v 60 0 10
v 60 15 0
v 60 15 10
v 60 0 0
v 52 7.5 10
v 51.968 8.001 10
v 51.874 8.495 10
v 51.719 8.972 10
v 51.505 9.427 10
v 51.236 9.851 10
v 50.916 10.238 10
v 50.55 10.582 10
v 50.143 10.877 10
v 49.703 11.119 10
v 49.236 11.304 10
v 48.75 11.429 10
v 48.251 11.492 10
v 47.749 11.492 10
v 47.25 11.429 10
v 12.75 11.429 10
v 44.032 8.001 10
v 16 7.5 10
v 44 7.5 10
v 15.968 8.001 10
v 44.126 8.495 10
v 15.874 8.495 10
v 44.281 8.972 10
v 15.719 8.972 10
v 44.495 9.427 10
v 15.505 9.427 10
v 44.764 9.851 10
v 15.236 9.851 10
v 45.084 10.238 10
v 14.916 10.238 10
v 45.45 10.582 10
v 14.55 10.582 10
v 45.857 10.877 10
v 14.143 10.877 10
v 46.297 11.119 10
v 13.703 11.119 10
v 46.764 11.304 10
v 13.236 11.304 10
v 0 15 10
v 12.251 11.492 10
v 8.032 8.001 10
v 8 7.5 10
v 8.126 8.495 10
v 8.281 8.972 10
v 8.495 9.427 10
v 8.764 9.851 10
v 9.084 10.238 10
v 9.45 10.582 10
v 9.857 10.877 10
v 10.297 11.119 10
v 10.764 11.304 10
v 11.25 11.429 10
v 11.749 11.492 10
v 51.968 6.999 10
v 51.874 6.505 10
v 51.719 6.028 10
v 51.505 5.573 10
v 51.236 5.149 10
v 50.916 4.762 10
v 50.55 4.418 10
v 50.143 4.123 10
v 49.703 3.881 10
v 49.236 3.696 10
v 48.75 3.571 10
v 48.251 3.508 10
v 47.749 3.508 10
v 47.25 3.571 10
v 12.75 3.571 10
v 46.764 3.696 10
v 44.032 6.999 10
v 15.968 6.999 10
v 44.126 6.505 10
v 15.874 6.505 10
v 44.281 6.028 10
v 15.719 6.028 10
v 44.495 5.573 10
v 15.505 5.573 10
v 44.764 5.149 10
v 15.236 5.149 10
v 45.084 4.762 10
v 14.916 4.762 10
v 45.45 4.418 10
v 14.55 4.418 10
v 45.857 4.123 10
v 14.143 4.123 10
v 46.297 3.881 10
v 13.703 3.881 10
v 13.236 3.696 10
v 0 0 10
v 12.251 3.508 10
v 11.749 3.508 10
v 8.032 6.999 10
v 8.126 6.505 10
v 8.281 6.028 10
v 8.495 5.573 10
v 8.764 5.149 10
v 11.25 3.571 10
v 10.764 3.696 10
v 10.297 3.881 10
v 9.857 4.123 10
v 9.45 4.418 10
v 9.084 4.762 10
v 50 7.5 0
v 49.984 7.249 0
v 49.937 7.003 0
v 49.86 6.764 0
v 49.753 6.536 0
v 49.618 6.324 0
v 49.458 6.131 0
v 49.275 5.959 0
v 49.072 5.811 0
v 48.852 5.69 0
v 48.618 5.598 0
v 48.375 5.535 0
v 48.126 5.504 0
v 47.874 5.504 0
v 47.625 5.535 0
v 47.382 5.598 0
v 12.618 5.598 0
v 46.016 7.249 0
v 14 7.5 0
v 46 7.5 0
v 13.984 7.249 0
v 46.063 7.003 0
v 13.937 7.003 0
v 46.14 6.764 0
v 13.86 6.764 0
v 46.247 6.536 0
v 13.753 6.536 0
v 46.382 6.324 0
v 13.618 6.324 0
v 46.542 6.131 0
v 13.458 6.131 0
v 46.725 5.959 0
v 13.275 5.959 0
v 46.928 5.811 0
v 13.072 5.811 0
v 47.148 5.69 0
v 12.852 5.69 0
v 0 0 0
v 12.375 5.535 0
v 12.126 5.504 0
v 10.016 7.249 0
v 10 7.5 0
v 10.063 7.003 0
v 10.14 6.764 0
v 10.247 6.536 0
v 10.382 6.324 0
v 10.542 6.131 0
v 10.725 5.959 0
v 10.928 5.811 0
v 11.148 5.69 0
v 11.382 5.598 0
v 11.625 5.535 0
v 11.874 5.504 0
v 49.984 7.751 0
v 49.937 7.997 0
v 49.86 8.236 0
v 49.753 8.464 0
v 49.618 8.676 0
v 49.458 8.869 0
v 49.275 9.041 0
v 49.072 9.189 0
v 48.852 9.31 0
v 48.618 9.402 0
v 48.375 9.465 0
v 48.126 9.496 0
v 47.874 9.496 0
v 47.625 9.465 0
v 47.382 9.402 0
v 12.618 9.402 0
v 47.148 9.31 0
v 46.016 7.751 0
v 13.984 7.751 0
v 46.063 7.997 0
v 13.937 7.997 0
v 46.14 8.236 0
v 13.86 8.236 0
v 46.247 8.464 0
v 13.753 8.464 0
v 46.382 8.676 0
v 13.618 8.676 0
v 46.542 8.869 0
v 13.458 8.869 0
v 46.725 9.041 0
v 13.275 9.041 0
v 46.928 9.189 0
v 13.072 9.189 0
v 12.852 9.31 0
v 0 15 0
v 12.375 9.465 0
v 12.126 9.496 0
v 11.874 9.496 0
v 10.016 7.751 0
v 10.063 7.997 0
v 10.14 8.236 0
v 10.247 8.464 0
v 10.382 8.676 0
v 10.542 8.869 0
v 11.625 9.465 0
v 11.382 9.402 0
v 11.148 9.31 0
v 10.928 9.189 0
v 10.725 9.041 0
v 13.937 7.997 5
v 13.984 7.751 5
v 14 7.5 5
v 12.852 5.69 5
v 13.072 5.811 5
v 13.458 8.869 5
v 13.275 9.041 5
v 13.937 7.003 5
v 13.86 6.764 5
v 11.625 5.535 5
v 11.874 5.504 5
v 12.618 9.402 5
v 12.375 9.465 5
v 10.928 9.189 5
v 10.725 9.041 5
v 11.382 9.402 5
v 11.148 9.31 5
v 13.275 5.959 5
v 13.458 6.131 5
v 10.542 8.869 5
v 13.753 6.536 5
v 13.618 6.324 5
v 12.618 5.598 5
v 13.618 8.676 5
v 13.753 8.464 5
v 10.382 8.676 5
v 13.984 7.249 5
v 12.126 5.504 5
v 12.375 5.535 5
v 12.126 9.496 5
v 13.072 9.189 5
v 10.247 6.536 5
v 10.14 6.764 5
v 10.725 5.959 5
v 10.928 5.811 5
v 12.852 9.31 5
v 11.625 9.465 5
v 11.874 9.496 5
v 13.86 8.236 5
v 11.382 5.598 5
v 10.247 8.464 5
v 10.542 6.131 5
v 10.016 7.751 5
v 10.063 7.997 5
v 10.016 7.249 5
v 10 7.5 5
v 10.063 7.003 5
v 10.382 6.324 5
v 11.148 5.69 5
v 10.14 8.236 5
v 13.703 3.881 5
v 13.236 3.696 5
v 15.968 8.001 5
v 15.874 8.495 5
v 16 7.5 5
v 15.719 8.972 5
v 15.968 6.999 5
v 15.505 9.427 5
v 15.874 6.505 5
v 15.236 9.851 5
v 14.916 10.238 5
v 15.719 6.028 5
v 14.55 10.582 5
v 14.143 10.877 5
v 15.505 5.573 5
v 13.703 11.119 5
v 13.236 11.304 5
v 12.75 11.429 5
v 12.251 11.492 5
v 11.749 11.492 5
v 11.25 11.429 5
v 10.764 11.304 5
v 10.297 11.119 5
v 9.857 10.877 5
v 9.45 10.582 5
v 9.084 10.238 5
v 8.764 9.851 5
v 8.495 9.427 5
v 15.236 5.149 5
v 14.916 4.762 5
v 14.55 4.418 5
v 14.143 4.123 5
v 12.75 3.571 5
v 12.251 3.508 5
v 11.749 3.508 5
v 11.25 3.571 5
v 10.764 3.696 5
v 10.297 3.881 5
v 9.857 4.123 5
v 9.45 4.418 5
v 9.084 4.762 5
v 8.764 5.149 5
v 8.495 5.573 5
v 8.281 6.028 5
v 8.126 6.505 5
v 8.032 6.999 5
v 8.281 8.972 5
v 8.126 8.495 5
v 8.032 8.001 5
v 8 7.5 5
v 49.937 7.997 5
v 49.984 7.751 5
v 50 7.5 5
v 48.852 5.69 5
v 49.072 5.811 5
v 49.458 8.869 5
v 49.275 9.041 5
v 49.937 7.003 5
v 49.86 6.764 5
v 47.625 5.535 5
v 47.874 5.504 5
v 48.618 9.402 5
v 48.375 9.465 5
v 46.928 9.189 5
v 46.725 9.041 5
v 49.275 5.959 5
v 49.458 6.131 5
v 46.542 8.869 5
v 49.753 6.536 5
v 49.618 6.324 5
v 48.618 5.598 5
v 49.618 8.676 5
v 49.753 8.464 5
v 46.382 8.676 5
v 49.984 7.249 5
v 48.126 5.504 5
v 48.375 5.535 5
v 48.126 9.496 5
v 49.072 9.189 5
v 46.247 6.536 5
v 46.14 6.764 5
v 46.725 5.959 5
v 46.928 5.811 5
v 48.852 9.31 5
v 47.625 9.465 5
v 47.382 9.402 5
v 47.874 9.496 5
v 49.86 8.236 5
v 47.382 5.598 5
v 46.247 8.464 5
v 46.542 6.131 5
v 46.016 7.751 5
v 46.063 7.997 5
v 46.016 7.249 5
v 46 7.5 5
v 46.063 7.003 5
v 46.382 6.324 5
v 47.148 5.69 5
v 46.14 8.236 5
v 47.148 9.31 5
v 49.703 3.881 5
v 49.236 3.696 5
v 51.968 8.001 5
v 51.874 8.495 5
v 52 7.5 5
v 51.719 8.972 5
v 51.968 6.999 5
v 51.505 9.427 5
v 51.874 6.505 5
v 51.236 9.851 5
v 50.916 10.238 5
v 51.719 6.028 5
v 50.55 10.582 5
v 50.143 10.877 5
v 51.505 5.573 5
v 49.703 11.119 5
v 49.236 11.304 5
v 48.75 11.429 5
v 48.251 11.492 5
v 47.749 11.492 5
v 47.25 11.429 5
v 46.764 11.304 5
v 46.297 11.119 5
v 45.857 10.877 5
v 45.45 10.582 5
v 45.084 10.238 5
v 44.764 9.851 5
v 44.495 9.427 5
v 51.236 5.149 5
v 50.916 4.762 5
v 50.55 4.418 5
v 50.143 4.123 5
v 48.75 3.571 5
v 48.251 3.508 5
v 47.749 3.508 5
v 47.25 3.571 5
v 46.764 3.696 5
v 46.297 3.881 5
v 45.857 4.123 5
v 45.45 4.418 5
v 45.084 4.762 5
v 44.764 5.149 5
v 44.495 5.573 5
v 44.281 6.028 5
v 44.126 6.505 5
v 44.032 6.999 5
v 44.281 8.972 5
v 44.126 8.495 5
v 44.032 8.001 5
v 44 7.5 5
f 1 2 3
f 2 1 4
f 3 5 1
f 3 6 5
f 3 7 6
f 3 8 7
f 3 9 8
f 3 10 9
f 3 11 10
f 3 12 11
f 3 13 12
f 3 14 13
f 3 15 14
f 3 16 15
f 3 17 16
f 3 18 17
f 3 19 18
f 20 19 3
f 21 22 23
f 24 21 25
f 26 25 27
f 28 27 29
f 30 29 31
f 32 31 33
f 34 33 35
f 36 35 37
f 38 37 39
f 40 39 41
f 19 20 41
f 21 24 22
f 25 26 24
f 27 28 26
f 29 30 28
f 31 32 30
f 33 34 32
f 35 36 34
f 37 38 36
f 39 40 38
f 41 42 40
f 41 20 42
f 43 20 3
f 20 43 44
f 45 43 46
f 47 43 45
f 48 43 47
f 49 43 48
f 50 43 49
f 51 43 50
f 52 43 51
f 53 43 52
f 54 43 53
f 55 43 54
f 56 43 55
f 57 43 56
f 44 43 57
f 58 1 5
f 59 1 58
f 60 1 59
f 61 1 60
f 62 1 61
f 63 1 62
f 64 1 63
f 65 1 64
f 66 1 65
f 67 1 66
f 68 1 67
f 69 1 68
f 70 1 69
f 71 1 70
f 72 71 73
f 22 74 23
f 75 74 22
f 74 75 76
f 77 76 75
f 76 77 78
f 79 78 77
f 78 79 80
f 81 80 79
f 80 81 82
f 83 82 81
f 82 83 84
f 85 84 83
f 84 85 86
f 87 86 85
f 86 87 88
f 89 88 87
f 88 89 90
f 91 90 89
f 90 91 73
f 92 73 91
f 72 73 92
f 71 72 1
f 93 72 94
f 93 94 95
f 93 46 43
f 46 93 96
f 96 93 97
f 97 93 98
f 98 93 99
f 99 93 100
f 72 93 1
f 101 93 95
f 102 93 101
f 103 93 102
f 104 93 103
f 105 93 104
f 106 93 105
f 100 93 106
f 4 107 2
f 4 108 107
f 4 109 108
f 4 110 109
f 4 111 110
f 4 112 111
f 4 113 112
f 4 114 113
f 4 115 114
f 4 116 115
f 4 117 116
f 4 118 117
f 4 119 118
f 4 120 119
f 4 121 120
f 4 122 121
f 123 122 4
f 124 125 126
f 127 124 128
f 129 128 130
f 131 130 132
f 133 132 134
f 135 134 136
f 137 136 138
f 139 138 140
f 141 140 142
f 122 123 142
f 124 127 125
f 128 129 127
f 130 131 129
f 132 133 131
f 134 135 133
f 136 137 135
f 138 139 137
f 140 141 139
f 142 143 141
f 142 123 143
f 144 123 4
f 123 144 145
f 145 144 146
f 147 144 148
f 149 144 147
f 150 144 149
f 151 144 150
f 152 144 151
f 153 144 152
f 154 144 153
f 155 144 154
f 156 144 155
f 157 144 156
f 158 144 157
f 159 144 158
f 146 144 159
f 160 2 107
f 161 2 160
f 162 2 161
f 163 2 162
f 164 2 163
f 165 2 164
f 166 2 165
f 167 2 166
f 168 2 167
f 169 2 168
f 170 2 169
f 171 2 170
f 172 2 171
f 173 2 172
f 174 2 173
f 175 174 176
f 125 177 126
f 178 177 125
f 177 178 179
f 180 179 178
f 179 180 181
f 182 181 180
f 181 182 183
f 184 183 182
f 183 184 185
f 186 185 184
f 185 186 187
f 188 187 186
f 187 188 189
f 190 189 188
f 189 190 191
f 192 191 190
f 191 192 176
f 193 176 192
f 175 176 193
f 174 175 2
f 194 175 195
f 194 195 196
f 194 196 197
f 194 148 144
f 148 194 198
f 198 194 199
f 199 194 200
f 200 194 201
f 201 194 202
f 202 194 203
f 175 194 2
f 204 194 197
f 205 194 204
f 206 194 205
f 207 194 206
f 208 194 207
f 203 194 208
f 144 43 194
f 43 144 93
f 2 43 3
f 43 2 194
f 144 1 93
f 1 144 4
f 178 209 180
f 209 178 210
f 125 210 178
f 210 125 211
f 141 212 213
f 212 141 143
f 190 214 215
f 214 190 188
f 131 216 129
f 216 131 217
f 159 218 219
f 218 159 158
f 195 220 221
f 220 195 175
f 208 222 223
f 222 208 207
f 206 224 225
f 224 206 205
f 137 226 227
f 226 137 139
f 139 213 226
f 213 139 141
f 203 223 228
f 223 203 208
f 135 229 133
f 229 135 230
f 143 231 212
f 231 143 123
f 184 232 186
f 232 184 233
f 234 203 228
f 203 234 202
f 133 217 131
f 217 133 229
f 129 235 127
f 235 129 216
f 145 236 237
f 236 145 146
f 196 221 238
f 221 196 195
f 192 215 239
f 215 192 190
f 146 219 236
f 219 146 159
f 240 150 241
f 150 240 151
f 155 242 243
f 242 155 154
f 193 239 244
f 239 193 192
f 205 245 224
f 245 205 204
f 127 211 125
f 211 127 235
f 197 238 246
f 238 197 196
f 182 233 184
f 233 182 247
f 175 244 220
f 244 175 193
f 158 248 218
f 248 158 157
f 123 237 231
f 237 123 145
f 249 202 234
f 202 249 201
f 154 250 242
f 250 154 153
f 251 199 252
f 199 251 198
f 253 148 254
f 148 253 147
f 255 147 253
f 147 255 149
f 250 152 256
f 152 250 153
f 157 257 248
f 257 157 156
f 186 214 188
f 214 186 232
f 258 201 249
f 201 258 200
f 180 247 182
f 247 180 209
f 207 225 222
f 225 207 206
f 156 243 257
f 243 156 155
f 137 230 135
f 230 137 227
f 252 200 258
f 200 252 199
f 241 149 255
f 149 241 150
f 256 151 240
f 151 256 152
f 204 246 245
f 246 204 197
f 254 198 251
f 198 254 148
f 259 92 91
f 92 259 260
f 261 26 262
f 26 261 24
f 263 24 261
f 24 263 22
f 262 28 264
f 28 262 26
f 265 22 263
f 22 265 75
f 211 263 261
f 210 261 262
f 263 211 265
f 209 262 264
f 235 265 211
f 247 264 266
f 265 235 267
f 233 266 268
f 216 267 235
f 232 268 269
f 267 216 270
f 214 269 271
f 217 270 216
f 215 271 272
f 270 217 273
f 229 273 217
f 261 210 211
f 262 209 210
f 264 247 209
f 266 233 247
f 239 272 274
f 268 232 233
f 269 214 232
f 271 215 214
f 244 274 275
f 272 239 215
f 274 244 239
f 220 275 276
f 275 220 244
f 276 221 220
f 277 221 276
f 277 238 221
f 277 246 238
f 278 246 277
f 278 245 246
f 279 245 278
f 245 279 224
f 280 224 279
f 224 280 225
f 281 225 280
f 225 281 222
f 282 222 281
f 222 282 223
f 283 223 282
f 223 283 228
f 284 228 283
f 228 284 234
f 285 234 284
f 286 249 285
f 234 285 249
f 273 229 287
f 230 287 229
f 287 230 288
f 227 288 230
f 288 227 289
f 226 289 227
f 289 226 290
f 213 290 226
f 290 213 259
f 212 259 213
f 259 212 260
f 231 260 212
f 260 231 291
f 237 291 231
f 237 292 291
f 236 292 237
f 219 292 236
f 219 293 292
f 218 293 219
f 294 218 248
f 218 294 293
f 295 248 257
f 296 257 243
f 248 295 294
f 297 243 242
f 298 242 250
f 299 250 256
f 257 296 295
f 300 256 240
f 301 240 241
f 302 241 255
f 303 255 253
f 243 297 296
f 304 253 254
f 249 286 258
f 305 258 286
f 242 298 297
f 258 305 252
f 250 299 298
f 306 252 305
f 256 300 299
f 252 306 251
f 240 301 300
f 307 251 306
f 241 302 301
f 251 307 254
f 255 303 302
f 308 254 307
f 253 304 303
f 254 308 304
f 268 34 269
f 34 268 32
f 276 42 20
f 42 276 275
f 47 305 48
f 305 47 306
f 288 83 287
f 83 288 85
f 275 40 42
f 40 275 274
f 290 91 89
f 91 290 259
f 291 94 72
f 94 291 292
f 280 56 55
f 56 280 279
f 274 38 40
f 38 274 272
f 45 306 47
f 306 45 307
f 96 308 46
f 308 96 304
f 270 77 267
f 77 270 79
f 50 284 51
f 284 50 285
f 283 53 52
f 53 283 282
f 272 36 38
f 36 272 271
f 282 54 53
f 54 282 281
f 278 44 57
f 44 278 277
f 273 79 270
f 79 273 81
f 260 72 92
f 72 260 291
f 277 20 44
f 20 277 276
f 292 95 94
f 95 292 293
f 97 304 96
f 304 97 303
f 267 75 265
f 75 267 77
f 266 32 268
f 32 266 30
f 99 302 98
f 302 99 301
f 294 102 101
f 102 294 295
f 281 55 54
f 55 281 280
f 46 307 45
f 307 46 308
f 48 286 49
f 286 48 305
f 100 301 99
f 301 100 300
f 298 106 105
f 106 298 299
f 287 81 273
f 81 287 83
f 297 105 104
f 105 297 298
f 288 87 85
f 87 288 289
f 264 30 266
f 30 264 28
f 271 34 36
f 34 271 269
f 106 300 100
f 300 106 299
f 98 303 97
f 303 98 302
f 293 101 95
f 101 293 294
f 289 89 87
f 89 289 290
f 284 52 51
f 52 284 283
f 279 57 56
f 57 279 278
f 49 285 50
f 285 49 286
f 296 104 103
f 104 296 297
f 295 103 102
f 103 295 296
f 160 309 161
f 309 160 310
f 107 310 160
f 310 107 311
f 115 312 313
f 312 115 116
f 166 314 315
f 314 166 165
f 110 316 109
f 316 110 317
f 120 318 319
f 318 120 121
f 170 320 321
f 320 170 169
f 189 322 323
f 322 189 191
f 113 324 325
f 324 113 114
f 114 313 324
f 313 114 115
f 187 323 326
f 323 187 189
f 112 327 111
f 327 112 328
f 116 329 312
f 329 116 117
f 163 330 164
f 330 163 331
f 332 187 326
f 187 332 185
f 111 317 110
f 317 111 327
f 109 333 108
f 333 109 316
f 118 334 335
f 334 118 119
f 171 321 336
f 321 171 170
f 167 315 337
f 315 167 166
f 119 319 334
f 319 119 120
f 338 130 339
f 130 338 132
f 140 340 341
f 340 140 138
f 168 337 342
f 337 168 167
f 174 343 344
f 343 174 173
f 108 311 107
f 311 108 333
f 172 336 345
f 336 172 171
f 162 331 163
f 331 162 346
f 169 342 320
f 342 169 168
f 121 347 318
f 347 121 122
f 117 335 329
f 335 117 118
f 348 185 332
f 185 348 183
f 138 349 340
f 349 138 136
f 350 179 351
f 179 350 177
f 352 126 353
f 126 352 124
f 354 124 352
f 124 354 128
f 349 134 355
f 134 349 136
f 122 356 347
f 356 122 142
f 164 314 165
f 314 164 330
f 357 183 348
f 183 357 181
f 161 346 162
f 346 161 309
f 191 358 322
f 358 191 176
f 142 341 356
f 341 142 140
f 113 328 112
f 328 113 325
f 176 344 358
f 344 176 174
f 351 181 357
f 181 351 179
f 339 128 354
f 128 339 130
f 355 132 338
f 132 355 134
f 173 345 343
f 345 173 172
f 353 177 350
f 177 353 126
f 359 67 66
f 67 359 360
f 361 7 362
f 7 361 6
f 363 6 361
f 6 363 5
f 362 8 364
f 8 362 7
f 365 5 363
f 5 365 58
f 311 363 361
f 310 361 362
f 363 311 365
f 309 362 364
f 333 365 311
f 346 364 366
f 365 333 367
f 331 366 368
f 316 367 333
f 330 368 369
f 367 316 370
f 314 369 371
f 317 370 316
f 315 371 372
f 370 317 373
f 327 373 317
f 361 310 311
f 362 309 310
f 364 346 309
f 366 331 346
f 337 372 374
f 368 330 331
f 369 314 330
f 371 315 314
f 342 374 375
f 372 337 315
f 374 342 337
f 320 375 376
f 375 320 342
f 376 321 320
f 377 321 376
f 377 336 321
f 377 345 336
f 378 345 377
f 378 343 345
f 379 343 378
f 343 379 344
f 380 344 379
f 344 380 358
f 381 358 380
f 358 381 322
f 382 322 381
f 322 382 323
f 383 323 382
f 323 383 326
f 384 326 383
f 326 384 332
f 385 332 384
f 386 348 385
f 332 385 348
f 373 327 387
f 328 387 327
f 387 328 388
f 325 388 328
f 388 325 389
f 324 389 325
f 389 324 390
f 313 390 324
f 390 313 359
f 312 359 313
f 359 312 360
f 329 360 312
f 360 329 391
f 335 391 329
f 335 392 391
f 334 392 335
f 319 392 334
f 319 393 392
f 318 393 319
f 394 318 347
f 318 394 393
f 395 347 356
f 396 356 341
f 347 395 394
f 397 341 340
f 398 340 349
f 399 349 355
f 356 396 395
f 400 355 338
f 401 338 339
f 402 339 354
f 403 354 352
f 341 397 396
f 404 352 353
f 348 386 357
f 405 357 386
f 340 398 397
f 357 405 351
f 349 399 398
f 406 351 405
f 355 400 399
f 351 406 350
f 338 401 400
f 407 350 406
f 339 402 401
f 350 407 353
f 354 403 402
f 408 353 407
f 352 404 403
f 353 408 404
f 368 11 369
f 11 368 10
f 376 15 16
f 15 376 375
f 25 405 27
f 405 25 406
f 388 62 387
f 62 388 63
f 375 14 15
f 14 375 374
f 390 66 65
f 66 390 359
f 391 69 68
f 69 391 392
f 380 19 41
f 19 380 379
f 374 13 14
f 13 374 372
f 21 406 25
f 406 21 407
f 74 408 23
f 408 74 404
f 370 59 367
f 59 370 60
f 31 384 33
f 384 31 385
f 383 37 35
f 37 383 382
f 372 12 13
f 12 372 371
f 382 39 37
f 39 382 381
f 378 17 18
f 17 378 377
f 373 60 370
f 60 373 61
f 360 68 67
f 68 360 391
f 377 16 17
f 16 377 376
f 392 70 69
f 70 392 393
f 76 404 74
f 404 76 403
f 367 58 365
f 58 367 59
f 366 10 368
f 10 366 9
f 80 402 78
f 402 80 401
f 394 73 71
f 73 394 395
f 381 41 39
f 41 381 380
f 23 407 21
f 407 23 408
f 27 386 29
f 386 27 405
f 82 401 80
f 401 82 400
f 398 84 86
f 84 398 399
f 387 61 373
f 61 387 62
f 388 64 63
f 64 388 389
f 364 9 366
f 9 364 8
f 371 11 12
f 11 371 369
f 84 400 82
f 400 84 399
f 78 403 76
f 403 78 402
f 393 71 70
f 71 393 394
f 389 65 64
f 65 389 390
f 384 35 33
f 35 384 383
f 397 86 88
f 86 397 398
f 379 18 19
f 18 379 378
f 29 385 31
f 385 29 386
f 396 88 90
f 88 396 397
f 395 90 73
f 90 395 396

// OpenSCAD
c_bloco = 60;
a_bloco = 10;
l_bloco = 15;

hole_dist = 0.6 * c_bloco;
hole_d = 4;
hole_head_d = 8;
hole_head_h = a_bloco - 5;

difference(){
    cube( [ c_bloco, l_bloco, a_bloco ] );
    translate( [ c_bloco / 2 - hole_dist / 2, l_bloco / 2, -1 ] )
        cylinder( h = a_bloco + 2, d = hole_d, $fn = 50 );
    translate( [ c_bloco / 2 - hole_dist / 2, l_bloco / 2, a_bloco - hole_head_h ] )
        cylinder( h = a_bloco + 2, d = hole_head_d, $fn = 50 );
    translate( [ c_bloco / 2 + hole_dist / 2, l_bloco / 2, -1 ] )
        cylinder( h = a_bloco + 2, d = hole_d, $fn = 50 );
    translate( [ c_bloco / 2 + hole_dist / 2, l_bloco / 2, a_bloco - hole_head_h ] )
        cylinder( h = a_bloco + 2, d = hole_head_d, $fn = 50 );
}
